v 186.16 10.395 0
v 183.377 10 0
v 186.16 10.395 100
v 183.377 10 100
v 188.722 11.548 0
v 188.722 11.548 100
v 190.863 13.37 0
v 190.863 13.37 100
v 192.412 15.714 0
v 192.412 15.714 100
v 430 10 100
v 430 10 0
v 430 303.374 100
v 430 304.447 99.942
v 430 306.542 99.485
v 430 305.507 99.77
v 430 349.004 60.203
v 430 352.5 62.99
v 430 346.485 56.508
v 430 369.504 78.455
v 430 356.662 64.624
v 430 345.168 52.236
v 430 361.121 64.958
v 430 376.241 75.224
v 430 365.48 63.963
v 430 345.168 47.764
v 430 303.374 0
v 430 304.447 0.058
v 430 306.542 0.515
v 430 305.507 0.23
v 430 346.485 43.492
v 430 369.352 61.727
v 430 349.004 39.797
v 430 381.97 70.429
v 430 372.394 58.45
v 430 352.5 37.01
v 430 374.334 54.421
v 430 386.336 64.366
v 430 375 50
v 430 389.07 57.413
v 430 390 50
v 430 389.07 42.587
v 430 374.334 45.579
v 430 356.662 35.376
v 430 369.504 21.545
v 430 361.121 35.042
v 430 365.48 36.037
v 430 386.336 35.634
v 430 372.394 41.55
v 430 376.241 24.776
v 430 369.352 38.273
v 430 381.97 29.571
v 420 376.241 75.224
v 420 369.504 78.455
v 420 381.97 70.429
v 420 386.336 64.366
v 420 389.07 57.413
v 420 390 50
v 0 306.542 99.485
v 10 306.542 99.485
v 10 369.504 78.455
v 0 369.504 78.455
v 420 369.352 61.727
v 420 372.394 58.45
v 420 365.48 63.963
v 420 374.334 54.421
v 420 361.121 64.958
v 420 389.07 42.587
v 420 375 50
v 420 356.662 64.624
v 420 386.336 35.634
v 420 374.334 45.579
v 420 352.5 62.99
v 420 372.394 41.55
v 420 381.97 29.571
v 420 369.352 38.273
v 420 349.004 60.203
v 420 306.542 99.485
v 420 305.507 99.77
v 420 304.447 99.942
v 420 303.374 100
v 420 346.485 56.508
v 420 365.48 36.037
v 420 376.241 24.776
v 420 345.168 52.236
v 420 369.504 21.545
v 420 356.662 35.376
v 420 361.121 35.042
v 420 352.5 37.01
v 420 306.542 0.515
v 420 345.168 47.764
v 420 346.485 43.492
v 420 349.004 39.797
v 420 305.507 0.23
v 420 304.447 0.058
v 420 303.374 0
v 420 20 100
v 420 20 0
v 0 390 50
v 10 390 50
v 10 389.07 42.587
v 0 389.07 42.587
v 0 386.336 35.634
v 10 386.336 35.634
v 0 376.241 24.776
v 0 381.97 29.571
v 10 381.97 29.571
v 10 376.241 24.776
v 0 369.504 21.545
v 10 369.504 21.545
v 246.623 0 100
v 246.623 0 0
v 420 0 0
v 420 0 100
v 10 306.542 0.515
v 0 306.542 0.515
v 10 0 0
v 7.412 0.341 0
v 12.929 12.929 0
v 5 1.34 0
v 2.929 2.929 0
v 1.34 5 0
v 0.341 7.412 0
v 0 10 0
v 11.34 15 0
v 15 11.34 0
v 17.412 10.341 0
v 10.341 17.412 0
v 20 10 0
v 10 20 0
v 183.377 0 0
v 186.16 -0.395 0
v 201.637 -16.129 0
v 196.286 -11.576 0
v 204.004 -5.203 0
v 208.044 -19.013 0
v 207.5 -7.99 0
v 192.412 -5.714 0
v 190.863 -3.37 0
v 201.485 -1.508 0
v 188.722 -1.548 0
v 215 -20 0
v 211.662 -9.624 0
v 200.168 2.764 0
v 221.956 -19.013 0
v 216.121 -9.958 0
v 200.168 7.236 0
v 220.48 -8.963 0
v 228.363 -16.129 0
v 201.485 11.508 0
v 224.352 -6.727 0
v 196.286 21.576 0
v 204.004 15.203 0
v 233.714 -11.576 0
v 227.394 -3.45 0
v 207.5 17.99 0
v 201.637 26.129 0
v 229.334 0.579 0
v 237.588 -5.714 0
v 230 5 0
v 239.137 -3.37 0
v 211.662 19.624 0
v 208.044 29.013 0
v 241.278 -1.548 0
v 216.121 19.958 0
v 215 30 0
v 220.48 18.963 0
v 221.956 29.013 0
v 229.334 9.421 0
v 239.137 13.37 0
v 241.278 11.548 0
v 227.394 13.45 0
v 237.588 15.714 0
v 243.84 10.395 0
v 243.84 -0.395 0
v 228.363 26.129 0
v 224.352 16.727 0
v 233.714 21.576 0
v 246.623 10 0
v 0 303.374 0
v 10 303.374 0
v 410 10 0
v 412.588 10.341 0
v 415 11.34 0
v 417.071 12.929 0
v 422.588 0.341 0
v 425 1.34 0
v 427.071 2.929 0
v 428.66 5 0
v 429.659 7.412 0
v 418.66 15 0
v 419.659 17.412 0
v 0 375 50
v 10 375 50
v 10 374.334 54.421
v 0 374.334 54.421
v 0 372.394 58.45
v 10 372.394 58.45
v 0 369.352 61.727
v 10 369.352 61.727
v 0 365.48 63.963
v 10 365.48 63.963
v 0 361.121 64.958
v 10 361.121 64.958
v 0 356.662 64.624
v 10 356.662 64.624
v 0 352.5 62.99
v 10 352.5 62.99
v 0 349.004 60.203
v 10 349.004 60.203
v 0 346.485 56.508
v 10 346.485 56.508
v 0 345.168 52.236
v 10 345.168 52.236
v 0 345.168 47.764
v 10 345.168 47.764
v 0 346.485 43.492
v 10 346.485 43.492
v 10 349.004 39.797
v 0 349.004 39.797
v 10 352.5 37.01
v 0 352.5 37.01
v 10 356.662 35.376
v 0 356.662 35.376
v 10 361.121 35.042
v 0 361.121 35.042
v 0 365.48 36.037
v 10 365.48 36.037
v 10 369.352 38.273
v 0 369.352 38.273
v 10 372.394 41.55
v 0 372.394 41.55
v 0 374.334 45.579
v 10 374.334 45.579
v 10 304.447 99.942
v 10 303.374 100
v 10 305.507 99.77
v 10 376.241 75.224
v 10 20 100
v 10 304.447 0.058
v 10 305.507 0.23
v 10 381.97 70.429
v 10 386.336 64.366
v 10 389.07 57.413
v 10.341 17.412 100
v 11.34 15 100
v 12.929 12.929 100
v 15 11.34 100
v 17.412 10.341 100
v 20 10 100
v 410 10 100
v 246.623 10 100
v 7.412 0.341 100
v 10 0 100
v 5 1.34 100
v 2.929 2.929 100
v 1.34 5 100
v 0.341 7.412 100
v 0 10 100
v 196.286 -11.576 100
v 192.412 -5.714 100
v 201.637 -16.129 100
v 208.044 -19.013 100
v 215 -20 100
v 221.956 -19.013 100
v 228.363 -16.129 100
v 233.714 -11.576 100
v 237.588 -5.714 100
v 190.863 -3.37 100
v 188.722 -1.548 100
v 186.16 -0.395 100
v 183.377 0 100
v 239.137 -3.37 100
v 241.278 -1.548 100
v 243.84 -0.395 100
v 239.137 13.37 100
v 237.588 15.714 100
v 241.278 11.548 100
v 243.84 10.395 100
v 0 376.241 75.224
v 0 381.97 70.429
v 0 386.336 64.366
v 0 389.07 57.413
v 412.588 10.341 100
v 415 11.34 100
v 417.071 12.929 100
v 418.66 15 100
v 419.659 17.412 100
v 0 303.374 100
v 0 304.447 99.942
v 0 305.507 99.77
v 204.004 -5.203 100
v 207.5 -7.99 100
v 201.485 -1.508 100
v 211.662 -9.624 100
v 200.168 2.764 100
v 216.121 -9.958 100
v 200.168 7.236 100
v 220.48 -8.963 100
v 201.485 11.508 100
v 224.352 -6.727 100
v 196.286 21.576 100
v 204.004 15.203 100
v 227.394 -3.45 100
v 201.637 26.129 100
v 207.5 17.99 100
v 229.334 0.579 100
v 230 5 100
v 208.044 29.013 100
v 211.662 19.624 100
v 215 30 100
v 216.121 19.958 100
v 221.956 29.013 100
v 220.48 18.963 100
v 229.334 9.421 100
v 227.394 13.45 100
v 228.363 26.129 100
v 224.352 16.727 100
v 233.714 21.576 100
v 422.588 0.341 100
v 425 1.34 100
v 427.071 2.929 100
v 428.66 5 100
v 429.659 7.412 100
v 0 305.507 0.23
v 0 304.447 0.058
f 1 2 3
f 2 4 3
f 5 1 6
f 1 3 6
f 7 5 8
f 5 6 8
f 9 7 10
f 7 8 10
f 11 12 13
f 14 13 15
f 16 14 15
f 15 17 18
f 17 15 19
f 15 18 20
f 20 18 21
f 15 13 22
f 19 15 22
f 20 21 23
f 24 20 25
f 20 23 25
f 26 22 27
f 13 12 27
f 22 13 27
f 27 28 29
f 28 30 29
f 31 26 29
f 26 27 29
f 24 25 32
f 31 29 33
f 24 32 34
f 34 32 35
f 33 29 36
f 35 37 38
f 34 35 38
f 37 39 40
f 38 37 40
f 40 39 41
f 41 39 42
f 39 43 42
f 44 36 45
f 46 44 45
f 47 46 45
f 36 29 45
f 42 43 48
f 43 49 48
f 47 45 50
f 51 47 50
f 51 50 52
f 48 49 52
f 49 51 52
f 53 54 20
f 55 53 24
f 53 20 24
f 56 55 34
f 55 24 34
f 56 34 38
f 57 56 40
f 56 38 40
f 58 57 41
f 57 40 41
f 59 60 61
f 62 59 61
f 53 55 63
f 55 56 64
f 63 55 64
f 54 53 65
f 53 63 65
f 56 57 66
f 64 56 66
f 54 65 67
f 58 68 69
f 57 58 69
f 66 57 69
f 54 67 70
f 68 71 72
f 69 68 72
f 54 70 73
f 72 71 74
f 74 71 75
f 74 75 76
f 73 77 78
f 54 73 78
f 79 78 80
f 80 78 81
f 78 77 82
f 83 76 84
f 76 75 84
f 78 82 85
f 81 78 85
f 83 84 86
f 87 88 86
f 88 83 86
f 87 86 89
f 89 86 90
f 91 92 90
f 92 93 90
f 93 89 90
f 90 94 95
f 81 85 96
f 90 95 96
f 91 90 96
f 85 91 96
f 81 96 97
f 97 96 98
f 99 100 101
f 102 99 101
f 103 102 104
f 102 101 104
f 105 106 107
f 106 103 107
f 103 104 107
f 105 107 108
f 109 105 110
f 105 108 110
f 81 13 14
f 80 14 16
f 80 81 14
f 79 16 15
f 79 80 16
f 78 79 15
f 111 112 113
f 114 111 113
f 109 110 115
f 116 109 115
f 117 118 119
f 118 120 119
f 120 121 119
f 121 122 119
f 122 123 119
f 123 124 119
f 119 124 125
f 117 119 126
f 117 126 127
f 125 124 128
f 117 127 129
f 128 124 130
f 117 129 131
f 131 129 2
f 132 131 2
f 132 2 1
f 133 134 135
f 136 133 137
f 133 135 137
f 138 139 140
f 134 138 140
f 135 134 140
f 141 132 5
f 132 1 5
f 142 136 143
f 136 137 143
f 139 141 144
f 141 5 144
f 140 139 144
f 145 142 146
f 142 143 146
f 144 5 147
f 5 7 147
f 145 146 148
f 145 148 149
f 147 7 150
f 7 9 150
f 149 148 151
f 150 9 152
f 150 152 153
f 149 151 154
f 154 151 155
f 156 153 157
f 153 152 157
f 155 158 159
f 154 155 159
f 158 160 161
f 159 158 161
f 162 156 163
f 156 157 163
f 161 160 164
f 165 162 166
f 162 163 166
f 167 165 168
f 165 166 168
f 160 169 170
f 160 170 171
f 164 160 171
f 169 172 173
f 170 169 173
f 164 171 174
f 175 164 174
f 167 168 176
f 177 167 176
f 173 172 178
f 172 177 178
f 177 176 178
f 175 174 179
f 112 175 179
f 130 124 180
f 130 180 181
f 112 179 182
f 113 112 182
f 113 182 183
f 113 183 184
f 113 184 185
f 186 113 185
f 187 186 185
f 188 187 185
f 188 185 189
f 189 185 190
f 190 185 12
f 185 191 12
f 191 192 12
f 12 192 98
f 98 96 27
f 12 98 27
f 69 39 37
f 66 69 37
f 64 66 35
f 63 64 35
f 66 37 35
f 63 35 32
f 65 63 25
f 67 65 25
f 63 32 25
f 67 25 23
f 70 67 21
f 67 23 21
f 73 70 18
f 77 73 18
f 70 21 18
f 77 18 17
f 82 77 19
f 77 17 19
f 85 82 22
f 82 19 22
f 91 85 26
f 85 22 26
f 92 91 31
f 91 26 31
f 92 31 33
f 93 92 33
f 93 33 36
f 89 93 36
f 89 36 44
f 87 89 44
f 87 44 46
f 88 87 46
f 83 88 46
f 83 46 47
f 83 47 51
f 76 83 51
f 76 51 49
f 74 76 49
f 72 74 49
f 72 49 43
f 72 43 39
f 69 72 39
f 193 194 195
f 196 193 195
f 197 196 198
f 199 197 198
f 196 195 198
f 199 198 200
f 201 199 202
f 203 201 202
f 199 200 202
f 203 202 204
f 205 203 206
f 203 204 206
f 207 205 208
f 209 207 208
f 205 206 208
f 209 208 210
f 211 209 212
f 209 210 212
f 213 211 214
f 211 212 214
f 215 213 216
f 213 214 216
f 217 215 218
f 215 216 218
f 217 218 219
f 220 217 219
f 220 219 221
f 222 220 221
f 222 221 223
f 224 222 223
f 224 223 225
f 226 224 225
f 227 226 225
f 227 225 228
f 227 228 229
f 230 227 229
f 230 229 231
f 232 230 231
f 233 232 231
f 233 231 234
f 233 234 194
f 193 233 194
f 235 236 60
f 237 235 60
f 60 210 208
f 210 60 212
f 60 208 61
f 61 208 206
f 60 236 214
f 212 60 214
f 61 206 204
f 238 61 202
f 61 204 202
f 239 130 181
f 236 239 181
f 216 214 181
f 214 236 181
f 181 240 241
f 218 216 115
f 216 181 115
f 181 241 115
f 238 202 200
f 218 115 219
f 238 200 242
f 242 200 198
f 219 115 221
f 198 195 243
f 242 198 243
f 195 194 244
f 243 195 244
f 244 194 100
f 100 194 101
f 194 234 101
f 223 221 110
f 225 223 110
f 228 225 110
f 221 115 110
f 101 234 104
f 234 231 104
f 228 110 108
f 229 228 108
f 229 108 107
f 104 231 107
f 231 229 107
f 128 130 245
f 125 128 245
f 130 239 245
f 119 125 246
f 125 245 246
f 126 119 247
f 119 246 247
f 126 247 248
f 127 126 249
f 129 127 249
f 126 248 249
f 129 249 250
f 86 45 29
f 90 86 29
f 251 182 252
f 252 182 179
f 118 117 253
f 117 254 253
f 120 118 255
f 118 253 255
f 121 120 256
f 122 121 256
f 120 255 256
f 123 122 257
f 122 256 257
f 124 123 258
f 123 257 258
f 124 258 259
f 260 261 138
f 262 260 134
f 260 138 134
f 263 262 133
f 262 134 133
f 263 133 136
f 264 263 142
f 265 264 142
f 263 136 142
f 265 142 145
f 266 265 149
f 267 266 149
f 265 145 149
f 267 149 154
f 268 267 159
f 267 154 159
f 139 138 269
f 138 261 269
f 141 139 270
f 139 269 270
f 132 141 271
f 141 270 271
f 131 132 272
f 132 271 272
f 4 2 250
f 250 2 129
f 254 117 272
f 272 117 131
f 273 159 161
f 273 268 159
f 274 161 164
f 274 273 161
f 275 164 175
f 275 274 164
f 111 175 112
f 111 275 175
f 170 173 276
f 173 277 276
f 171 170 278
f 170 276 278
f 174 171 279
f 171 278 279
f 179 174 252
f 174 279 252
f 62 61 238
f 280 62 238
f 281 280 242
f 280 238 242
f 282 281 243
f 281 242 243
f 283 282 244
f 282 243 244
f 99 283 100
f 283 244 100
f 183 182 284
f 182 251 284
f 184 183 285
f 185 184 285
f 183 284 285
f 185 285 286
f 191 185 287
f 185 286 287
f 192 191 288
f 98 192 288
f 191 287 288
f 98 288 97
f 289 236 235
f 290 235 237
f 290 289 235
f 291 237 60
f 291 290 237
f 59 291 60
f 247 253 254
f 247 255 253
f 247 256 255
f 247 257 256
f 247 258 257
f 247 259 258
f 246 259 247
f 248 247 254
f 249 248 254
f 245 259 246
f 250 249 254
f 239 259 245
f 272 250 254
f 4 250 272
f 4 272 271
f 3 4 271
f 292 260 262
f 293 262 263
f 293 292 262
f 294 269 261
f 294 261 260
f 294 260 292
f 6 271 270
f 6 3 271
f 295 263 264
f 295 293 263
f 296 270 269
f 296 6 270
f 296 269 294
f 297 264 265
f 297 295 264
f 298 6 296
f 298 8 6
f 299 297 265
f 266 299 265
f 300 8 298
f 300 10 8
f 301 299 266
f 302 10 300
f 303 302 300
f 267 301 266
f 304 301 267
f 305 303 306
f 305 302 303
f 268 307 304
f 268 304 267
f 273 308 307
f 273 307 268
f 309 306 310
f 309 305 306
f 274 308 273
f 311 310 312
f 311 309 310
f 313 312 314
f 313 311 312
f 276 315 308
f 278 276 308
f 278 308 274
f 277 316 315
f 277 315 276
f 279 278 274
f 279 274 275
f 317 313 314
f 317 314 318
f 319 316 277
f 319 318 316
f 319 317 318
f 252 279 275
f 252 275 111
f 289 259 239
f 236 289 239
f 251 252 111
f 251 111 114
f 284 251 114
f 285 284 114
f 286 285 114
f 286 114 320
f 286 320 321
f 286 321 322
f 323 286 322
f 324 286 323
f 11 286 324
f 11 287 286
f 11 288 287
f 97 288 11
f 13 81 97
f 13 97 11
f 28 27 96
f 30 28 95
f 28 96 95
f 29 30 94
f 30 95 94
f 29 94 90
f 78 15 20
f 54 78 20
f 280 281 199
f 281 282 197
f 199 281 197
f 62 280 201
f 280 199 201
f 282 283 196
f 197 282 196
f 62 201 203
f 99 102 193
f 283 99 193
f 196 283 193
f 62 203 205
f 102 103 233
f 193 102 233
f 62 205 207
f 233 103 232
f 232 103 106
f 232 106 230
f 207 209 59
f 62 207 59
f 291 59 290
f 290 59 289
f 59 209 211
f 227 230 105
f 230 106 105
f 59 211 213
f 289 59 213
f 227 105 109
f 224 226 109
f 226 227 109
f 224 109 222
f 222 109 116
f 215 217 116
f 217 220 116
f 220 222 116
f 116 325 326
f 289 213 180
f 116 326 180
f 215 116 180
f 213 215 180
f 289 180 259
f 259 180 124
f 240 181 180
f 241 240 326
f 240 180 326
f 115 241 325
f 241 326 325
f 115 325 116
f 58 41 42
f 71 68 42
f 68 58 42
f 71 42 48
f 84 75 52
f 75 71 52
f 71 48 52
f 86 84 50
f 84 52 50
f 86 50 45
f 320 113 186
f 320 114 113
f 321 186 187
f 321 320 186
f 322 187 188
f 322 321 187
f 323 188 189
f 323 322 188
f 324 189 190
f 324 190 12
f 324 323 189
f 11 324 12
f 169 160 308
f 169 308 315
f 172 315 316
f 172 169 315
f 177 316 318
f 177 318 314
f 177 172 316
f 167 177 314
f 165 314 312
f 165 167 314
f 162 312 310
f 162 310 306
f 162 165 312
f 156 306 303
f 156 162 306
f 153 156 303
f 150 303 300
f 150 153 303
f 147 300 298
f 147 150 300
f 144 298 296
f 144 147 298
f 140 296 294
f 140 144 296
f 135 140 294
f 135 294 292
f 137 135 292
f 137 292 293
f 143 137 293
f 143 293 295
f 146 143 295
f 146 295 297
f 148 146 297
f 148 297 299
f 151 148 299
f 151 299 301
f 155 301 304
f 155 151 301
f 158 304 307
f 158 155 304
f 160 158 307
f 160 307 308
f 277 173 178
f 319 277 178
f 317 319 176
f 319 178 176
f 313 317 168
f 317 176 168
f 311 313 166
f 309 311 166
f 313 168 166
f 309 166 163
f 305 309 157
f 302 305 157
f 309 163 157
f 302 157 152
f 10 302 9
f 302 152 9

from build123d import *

# Parameters (mm, degrees)
ESQUISSE1_R             = 15
BOSS_EXTRU_1_DEPTH      = 100
ESQUISSE2_R             = 15
ENL_V_MAT_EXTRU_1_DEPTH = 590.067059001
CONG_1_R                = 10


with BuildPart() as part:
    # Esquisse1 → Boss.-Extru.1 (new body)
    with BuildSketch(Plane.XY):
        with BuildLine():
            Line((10, 0), (190.505102572, 0))
            ThreePointArc((190.505102572, 0), (215, -20), (239.494897428, 0))
            Line((239.494897428, 0), (420, 0))
            Line((420, 0), (430, 0))
            Line((430, 0), (430, 390))
            Line((430, 390), (420, 390))
            Line((420, 390), (420, 10))
            Line((420, 10), (239.494897428, 10))
            ThreePointArc((239.494897428, 10), (215, 30), (190.505102572, 10))
            Line((190.505102572, 10), (10, 10))
            Line((10, 10), (10, 390))
            Line((10, 390), (0, 390))
            Line((0, 390), (0, 0))
            Line((0, 0), (10, 0))
        make_face()
        with Locations((215, 5)):
            Circle(ESQUISSE1_R, mode=Mode.SUBTRACT)
    extrude(amount=BOSS_EXTRU_1_DEPTH)

    # Esquisse2 → Enlèv. mat.-Extru.1 (cut, through all)
    with BuildSketch(Plane(origin=(430, 0, 0), x_dir=(0, 0, -1), z_dir=(1, 0, 0))):
        with BuildLine():
            Line((-100, 305), (-78.45468447, 369.504258609))
            ThreePointArc((-78.45468447, 369.504258609), (-67.533856417, 384.342635008), (-50, 390))
            Line((-50, 390), (-100, 390))
            Line((-100, 390), (-100, 305))
        make_face()
        Polygon((-120.94696684, 305), (-100, 305), (-100, 390), (-50, 390), (0, 390), (0, 305), (20.94696684, 305), (20.94696684, 555.583179512), (-120.94696684, 555.583179512), align=None)
        with BuildLine():
            Line((0, 390), (-50, 390))
            ThreePointArc((-50, 390), (-32.466143583, 384.342635008), (-21.54531553, 369.504258609))
            Line((-21.54531553, 369.504258609), (0, 305))
            Line((0, 305), (0, 390))
        make_face()
        with Locations(Location((-50, 360, 0), (0, 0, 90))):
            Circle(ESQUISSE2_R)
    extrude(amount=-ENL_V_MAT_EXTRU_1_DEPTH, mode=Mode.SUBTRACT)

    # Congé1
    cong_1_edges = [part.edges().sort_by_distance(p)[0] for p in [
        (0, 0, 50),
        (10, 10, 50),
        (190.505102572, 10, 50),
        (239.494897428, 10, 50),
        (420, 10, 50),
        (430, 0, 50),
        (239.494897428, 0, 50),
        (190.505102572, 0, 50),
        (425, 305, 0),
        (425, 305, 100),
        (5, 305, 100),
        (5, 305, 0),
    ]]
    fillet(cong_1_edges, radius=CONG_1_R)


solid = part.part
